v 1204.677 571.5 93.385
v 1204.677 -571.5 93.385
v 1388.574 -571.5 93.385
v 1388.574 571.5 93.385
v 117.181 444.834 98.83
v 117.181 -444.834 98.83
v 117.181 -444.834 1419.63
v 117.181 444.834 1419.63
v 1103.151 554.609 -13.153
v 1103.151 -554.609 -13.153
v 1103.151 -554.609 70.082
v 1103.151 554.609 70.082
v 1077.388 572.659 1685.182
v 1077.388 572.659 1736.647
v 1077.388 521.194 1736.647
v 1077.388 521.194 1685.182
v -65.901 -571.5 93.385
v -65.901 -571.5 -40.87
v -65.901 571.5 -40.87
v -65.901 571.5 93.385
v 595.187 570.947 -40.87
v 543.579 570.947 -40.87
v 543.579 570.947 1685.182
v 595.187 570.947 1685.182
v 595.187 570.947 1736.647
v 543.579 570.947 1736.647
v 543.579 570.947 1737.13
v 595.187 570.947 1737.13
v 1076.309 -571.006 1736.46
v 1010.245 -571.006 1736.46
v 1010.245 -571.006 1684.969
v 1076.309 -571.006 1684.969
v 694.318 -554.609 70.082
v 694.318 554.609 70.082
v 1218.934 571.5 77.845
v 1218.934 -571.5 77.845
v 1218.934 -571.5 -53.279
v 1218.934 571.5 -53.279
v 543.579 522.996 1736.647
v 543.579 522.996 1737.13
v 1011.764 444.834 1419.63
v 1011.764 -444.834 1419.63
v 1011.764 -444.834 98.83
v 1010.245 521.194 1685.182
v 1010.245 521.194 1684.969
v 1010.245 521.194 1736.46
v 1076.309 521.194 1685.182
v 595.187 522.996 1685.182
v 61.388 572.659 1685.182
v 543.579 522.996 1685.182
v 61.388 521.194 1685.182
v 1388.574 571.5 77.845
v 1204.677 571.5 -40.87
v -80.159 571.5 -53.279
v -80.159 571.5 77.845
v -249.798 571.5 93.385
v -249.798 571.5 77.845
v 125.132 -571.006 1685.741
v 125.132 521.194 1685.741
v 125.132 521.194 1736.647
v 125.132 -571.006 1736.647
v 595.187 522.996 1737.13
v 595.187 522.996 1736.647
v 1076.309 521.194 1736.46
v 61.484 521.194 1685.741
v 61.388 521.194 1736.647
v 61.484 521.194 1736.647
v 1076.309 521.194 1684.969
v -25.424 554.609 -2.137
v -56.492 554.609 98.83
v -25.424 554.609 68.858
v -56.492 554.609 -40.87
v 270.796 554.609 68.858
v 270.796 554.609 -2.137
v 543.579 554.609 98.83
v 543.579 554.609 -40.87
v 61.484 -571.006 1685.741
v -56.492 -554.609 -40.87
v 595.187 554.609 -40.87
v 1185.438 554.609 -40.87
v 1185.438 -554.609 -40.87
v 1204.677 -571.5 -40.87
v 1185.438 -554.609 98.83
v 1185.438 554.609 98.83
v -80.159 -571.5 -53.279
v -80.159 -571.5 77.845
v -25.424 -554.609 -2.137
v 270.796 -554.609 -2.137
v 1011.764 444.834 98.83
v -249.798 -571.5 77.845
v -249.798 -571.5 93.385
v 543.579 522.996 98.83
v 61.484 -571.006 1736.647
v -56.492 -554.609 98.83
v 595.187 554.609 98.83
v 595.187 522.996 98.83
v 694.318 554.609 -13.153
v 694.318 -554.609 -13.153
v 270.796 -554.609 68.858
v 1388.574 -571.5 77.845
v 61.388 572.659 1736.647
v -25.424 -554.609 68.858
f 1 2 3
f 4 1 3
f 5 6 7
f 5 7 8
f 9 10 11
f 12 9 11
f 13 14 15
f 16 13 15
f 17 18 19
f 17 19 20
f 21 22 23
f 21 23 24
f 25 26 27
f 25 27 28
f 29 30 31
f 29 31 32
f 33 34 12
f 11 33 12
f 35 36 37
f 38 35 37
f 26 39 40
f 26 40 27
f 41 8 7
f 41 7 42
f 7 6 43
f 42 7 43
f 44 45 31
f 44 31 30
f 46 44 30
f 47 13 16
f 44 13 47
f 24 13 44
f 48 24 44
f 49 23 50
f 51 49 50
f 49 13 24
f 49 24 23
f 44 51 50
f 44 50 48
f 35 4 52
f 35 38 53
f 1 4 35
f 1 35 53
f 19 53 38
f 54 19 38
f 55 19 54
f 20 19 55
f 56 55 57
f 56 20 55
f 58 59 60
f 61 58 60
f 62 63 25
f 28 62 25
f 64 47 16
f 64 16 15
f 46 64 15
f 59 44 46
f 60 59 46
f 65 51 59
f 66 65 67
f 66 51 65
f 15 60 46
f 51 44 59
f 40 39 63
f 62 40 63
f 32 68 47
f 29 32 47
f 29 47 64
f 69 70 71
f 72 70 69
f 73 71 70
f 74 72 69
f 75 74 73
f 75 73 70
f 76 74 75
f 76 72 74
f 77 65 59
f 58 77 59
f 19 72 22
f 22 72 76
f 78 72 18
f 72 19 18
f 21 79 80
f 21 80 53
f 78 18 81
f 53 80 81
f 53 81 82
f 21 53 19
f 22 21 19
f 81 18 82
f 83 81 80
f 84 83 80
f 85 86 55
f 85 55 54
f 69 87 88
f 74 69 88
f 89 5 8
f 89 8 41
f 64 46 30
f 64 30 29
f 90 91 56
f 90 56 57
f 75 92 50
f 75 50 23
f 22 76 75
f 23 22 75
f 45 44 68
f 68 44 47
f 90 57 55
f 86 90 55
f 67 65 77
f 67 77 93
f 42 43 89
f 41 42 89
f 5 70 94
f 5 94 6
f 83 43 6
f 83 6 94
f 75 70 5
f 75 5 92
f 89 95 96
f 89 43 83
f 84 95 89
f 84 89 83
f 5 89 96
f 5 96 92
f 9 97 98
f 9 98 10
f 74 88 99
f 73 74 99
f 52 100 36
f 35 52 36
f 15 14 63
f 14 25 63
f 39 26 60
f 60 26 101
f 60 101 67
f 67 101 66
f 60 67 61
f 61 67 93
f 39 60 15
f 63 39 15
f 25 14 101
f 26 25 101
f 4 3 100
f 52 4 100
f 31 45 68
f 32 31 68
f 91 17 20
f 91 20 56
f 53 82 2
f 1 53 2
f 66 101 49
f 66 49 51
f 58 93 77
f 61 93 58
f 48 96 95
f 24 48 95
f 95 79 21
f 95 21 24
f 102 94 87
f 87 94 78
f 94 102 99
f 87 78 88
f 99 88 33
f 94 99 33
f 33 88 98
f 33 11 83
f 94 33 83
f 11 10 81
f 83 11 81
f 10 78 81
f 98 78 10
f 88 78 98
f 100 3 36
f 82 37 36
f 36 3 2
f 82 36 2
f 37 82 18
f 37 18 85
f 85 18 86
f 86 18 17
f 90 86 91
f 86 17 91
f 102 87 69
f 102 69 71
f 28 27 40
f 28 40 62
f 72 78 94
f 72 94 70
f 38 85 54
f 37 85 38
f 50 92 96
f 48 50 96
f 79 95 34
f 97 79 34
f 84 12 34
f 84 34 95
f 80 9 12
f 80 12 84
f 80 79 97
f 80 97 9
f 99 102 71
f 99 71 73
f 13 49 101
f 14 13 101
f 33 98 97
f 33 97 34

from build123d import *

# Parameters (mm, degrees)
F0_W      = 1284.835703671
F0_H      = 12.4089680612
F1_DEPTH  = 571.5
F3_DEPTH  = 1143
F6_W      = 51.6073703766
F6_H      = 47.9507148266
F7_DEPTH  = 1778
F8_W      = 51.4650344849
F8_H      = 51.4650344849
F9_DEPTH  = 508
F10_W     = 63.6484324932
F10_H     = 50.9061813354
F10_W_2   = 66.0638809204
F10_H_2   = 51.4912605286
F11_DEPTH = 1092.2
F12_W     = 1241.9298887253
F12_H     = 1109.2171669006
F13_DEPTH = 139.7
F14_W     = 296.2205260992
F14_H     = 70.9949955344
F14_W_2   = 408.8332653046
F14_H_2   = 83.2355730236
F15_DEPTH = 1127.2688971291
F16_W     = 894.5828676224
F16_H     = 889.6675109863
F17_DEPTH = 1320.8


with BuildPart() as f1:
    # F0 (on Front) → F1 (new body, symmetric)
    with BuildSketch(Plane.XZ):
        with Locations((576.5165500343, -47.0742117614)):
            Rectangle(F0_W, F0_H)
    extrude(amount=F1_DEPTH, both=True)

    # F2 (on face) → F3 (join)
    with BuildSketch(Plane.XZ.offset(571.5)):
        Polygon((-65.9013018012, -53.278695792), (-65.9013018012, -40.8697277308), (-65.9013018012, 93.3853983879), (-249.7984468937, 93.3853983879), (-249.7984468937, 77.8451710939), (-80.1585838199, 77.8451710939), (-80.1585838199, -53.278695792), align=None)
    extrude(amount=-F3_DEPTH)

    # F5: F1 across plane


with BuildPart() as f1_1:
    add(f1.part)
    add(f1.part.mirror(Plane(origin=(569.387909025, 0, -17.3954870552), x_dir=(0, -1, 0), z_dir=(-1, 0, 0))))

    # F6 (on face) → F7 (join)
    with BuildSketch(Plane.XY.offset(-40.8697277308)):
        with Locations((569.3829655647, 546.9712764025)):
            Rectangle(F6_W, F6_H)
    extrude(amount=F7_DEPTH)

    # F8 (on mid) → F9 (join, symmetric)
    with BuildSketch(Plane(origin=(569.387909025, 0, 0), x_dir=(0, -1, 0), z_dir=(-1, 0, 0))):
        with Locations((-546.9267964363, 1710.9147310257)):
            Rectangle(F8_W, F8_H)
    extrude(amount=F9_DEPTH, both=True)

    # F10 (on face) → F11 (join)
    with BuildSketch(Plane.XZ.offset(-521.1942791939)):
        with Locations((93.3082550764, 1711.1941576004)):
            Rectangle(F10_W, F10_H)
        with Locations((1043.2767868042, 1710.7145786285)):
            Rectangle(F10_W_2, F10_H_2)
    extrude(amount=F11_DEPTH)

    # F12 (on face) → F13 (join)
    with BuildSketch(Plane.XY.offset(-40.8697277308)):
        with Locations((564.4726157188, 0)):
            Rectangle(F12_W, F12_H)
    extrude(amount=F13_DEPTH)

    # F14 (on face) → F15 (cut, through all)
    with BuildSketch(Plane.XZ.offset(554.6085834503)):
        with Locations((122.6859763265, 33.3608575165)):
            Rectangle(F14_W, F14_H)
        with Locations((898.7348079681, 28.4646395594)):
            Rectangle(F14_W_2, F14_H_2)
    extrude(amount=-F15_DEPTH, mode=Mode.SUBTRACT)

    # F16 (on face) → F17 (join)
    with BuildSketch(Plane.XY.offset(98.8302722692)):
        with Locations((564.4726157188, 0)):
            Rectangle(F16_W, F16_H)
    extrude(amount=F17_DEPTH)


solid = f1_1.part
